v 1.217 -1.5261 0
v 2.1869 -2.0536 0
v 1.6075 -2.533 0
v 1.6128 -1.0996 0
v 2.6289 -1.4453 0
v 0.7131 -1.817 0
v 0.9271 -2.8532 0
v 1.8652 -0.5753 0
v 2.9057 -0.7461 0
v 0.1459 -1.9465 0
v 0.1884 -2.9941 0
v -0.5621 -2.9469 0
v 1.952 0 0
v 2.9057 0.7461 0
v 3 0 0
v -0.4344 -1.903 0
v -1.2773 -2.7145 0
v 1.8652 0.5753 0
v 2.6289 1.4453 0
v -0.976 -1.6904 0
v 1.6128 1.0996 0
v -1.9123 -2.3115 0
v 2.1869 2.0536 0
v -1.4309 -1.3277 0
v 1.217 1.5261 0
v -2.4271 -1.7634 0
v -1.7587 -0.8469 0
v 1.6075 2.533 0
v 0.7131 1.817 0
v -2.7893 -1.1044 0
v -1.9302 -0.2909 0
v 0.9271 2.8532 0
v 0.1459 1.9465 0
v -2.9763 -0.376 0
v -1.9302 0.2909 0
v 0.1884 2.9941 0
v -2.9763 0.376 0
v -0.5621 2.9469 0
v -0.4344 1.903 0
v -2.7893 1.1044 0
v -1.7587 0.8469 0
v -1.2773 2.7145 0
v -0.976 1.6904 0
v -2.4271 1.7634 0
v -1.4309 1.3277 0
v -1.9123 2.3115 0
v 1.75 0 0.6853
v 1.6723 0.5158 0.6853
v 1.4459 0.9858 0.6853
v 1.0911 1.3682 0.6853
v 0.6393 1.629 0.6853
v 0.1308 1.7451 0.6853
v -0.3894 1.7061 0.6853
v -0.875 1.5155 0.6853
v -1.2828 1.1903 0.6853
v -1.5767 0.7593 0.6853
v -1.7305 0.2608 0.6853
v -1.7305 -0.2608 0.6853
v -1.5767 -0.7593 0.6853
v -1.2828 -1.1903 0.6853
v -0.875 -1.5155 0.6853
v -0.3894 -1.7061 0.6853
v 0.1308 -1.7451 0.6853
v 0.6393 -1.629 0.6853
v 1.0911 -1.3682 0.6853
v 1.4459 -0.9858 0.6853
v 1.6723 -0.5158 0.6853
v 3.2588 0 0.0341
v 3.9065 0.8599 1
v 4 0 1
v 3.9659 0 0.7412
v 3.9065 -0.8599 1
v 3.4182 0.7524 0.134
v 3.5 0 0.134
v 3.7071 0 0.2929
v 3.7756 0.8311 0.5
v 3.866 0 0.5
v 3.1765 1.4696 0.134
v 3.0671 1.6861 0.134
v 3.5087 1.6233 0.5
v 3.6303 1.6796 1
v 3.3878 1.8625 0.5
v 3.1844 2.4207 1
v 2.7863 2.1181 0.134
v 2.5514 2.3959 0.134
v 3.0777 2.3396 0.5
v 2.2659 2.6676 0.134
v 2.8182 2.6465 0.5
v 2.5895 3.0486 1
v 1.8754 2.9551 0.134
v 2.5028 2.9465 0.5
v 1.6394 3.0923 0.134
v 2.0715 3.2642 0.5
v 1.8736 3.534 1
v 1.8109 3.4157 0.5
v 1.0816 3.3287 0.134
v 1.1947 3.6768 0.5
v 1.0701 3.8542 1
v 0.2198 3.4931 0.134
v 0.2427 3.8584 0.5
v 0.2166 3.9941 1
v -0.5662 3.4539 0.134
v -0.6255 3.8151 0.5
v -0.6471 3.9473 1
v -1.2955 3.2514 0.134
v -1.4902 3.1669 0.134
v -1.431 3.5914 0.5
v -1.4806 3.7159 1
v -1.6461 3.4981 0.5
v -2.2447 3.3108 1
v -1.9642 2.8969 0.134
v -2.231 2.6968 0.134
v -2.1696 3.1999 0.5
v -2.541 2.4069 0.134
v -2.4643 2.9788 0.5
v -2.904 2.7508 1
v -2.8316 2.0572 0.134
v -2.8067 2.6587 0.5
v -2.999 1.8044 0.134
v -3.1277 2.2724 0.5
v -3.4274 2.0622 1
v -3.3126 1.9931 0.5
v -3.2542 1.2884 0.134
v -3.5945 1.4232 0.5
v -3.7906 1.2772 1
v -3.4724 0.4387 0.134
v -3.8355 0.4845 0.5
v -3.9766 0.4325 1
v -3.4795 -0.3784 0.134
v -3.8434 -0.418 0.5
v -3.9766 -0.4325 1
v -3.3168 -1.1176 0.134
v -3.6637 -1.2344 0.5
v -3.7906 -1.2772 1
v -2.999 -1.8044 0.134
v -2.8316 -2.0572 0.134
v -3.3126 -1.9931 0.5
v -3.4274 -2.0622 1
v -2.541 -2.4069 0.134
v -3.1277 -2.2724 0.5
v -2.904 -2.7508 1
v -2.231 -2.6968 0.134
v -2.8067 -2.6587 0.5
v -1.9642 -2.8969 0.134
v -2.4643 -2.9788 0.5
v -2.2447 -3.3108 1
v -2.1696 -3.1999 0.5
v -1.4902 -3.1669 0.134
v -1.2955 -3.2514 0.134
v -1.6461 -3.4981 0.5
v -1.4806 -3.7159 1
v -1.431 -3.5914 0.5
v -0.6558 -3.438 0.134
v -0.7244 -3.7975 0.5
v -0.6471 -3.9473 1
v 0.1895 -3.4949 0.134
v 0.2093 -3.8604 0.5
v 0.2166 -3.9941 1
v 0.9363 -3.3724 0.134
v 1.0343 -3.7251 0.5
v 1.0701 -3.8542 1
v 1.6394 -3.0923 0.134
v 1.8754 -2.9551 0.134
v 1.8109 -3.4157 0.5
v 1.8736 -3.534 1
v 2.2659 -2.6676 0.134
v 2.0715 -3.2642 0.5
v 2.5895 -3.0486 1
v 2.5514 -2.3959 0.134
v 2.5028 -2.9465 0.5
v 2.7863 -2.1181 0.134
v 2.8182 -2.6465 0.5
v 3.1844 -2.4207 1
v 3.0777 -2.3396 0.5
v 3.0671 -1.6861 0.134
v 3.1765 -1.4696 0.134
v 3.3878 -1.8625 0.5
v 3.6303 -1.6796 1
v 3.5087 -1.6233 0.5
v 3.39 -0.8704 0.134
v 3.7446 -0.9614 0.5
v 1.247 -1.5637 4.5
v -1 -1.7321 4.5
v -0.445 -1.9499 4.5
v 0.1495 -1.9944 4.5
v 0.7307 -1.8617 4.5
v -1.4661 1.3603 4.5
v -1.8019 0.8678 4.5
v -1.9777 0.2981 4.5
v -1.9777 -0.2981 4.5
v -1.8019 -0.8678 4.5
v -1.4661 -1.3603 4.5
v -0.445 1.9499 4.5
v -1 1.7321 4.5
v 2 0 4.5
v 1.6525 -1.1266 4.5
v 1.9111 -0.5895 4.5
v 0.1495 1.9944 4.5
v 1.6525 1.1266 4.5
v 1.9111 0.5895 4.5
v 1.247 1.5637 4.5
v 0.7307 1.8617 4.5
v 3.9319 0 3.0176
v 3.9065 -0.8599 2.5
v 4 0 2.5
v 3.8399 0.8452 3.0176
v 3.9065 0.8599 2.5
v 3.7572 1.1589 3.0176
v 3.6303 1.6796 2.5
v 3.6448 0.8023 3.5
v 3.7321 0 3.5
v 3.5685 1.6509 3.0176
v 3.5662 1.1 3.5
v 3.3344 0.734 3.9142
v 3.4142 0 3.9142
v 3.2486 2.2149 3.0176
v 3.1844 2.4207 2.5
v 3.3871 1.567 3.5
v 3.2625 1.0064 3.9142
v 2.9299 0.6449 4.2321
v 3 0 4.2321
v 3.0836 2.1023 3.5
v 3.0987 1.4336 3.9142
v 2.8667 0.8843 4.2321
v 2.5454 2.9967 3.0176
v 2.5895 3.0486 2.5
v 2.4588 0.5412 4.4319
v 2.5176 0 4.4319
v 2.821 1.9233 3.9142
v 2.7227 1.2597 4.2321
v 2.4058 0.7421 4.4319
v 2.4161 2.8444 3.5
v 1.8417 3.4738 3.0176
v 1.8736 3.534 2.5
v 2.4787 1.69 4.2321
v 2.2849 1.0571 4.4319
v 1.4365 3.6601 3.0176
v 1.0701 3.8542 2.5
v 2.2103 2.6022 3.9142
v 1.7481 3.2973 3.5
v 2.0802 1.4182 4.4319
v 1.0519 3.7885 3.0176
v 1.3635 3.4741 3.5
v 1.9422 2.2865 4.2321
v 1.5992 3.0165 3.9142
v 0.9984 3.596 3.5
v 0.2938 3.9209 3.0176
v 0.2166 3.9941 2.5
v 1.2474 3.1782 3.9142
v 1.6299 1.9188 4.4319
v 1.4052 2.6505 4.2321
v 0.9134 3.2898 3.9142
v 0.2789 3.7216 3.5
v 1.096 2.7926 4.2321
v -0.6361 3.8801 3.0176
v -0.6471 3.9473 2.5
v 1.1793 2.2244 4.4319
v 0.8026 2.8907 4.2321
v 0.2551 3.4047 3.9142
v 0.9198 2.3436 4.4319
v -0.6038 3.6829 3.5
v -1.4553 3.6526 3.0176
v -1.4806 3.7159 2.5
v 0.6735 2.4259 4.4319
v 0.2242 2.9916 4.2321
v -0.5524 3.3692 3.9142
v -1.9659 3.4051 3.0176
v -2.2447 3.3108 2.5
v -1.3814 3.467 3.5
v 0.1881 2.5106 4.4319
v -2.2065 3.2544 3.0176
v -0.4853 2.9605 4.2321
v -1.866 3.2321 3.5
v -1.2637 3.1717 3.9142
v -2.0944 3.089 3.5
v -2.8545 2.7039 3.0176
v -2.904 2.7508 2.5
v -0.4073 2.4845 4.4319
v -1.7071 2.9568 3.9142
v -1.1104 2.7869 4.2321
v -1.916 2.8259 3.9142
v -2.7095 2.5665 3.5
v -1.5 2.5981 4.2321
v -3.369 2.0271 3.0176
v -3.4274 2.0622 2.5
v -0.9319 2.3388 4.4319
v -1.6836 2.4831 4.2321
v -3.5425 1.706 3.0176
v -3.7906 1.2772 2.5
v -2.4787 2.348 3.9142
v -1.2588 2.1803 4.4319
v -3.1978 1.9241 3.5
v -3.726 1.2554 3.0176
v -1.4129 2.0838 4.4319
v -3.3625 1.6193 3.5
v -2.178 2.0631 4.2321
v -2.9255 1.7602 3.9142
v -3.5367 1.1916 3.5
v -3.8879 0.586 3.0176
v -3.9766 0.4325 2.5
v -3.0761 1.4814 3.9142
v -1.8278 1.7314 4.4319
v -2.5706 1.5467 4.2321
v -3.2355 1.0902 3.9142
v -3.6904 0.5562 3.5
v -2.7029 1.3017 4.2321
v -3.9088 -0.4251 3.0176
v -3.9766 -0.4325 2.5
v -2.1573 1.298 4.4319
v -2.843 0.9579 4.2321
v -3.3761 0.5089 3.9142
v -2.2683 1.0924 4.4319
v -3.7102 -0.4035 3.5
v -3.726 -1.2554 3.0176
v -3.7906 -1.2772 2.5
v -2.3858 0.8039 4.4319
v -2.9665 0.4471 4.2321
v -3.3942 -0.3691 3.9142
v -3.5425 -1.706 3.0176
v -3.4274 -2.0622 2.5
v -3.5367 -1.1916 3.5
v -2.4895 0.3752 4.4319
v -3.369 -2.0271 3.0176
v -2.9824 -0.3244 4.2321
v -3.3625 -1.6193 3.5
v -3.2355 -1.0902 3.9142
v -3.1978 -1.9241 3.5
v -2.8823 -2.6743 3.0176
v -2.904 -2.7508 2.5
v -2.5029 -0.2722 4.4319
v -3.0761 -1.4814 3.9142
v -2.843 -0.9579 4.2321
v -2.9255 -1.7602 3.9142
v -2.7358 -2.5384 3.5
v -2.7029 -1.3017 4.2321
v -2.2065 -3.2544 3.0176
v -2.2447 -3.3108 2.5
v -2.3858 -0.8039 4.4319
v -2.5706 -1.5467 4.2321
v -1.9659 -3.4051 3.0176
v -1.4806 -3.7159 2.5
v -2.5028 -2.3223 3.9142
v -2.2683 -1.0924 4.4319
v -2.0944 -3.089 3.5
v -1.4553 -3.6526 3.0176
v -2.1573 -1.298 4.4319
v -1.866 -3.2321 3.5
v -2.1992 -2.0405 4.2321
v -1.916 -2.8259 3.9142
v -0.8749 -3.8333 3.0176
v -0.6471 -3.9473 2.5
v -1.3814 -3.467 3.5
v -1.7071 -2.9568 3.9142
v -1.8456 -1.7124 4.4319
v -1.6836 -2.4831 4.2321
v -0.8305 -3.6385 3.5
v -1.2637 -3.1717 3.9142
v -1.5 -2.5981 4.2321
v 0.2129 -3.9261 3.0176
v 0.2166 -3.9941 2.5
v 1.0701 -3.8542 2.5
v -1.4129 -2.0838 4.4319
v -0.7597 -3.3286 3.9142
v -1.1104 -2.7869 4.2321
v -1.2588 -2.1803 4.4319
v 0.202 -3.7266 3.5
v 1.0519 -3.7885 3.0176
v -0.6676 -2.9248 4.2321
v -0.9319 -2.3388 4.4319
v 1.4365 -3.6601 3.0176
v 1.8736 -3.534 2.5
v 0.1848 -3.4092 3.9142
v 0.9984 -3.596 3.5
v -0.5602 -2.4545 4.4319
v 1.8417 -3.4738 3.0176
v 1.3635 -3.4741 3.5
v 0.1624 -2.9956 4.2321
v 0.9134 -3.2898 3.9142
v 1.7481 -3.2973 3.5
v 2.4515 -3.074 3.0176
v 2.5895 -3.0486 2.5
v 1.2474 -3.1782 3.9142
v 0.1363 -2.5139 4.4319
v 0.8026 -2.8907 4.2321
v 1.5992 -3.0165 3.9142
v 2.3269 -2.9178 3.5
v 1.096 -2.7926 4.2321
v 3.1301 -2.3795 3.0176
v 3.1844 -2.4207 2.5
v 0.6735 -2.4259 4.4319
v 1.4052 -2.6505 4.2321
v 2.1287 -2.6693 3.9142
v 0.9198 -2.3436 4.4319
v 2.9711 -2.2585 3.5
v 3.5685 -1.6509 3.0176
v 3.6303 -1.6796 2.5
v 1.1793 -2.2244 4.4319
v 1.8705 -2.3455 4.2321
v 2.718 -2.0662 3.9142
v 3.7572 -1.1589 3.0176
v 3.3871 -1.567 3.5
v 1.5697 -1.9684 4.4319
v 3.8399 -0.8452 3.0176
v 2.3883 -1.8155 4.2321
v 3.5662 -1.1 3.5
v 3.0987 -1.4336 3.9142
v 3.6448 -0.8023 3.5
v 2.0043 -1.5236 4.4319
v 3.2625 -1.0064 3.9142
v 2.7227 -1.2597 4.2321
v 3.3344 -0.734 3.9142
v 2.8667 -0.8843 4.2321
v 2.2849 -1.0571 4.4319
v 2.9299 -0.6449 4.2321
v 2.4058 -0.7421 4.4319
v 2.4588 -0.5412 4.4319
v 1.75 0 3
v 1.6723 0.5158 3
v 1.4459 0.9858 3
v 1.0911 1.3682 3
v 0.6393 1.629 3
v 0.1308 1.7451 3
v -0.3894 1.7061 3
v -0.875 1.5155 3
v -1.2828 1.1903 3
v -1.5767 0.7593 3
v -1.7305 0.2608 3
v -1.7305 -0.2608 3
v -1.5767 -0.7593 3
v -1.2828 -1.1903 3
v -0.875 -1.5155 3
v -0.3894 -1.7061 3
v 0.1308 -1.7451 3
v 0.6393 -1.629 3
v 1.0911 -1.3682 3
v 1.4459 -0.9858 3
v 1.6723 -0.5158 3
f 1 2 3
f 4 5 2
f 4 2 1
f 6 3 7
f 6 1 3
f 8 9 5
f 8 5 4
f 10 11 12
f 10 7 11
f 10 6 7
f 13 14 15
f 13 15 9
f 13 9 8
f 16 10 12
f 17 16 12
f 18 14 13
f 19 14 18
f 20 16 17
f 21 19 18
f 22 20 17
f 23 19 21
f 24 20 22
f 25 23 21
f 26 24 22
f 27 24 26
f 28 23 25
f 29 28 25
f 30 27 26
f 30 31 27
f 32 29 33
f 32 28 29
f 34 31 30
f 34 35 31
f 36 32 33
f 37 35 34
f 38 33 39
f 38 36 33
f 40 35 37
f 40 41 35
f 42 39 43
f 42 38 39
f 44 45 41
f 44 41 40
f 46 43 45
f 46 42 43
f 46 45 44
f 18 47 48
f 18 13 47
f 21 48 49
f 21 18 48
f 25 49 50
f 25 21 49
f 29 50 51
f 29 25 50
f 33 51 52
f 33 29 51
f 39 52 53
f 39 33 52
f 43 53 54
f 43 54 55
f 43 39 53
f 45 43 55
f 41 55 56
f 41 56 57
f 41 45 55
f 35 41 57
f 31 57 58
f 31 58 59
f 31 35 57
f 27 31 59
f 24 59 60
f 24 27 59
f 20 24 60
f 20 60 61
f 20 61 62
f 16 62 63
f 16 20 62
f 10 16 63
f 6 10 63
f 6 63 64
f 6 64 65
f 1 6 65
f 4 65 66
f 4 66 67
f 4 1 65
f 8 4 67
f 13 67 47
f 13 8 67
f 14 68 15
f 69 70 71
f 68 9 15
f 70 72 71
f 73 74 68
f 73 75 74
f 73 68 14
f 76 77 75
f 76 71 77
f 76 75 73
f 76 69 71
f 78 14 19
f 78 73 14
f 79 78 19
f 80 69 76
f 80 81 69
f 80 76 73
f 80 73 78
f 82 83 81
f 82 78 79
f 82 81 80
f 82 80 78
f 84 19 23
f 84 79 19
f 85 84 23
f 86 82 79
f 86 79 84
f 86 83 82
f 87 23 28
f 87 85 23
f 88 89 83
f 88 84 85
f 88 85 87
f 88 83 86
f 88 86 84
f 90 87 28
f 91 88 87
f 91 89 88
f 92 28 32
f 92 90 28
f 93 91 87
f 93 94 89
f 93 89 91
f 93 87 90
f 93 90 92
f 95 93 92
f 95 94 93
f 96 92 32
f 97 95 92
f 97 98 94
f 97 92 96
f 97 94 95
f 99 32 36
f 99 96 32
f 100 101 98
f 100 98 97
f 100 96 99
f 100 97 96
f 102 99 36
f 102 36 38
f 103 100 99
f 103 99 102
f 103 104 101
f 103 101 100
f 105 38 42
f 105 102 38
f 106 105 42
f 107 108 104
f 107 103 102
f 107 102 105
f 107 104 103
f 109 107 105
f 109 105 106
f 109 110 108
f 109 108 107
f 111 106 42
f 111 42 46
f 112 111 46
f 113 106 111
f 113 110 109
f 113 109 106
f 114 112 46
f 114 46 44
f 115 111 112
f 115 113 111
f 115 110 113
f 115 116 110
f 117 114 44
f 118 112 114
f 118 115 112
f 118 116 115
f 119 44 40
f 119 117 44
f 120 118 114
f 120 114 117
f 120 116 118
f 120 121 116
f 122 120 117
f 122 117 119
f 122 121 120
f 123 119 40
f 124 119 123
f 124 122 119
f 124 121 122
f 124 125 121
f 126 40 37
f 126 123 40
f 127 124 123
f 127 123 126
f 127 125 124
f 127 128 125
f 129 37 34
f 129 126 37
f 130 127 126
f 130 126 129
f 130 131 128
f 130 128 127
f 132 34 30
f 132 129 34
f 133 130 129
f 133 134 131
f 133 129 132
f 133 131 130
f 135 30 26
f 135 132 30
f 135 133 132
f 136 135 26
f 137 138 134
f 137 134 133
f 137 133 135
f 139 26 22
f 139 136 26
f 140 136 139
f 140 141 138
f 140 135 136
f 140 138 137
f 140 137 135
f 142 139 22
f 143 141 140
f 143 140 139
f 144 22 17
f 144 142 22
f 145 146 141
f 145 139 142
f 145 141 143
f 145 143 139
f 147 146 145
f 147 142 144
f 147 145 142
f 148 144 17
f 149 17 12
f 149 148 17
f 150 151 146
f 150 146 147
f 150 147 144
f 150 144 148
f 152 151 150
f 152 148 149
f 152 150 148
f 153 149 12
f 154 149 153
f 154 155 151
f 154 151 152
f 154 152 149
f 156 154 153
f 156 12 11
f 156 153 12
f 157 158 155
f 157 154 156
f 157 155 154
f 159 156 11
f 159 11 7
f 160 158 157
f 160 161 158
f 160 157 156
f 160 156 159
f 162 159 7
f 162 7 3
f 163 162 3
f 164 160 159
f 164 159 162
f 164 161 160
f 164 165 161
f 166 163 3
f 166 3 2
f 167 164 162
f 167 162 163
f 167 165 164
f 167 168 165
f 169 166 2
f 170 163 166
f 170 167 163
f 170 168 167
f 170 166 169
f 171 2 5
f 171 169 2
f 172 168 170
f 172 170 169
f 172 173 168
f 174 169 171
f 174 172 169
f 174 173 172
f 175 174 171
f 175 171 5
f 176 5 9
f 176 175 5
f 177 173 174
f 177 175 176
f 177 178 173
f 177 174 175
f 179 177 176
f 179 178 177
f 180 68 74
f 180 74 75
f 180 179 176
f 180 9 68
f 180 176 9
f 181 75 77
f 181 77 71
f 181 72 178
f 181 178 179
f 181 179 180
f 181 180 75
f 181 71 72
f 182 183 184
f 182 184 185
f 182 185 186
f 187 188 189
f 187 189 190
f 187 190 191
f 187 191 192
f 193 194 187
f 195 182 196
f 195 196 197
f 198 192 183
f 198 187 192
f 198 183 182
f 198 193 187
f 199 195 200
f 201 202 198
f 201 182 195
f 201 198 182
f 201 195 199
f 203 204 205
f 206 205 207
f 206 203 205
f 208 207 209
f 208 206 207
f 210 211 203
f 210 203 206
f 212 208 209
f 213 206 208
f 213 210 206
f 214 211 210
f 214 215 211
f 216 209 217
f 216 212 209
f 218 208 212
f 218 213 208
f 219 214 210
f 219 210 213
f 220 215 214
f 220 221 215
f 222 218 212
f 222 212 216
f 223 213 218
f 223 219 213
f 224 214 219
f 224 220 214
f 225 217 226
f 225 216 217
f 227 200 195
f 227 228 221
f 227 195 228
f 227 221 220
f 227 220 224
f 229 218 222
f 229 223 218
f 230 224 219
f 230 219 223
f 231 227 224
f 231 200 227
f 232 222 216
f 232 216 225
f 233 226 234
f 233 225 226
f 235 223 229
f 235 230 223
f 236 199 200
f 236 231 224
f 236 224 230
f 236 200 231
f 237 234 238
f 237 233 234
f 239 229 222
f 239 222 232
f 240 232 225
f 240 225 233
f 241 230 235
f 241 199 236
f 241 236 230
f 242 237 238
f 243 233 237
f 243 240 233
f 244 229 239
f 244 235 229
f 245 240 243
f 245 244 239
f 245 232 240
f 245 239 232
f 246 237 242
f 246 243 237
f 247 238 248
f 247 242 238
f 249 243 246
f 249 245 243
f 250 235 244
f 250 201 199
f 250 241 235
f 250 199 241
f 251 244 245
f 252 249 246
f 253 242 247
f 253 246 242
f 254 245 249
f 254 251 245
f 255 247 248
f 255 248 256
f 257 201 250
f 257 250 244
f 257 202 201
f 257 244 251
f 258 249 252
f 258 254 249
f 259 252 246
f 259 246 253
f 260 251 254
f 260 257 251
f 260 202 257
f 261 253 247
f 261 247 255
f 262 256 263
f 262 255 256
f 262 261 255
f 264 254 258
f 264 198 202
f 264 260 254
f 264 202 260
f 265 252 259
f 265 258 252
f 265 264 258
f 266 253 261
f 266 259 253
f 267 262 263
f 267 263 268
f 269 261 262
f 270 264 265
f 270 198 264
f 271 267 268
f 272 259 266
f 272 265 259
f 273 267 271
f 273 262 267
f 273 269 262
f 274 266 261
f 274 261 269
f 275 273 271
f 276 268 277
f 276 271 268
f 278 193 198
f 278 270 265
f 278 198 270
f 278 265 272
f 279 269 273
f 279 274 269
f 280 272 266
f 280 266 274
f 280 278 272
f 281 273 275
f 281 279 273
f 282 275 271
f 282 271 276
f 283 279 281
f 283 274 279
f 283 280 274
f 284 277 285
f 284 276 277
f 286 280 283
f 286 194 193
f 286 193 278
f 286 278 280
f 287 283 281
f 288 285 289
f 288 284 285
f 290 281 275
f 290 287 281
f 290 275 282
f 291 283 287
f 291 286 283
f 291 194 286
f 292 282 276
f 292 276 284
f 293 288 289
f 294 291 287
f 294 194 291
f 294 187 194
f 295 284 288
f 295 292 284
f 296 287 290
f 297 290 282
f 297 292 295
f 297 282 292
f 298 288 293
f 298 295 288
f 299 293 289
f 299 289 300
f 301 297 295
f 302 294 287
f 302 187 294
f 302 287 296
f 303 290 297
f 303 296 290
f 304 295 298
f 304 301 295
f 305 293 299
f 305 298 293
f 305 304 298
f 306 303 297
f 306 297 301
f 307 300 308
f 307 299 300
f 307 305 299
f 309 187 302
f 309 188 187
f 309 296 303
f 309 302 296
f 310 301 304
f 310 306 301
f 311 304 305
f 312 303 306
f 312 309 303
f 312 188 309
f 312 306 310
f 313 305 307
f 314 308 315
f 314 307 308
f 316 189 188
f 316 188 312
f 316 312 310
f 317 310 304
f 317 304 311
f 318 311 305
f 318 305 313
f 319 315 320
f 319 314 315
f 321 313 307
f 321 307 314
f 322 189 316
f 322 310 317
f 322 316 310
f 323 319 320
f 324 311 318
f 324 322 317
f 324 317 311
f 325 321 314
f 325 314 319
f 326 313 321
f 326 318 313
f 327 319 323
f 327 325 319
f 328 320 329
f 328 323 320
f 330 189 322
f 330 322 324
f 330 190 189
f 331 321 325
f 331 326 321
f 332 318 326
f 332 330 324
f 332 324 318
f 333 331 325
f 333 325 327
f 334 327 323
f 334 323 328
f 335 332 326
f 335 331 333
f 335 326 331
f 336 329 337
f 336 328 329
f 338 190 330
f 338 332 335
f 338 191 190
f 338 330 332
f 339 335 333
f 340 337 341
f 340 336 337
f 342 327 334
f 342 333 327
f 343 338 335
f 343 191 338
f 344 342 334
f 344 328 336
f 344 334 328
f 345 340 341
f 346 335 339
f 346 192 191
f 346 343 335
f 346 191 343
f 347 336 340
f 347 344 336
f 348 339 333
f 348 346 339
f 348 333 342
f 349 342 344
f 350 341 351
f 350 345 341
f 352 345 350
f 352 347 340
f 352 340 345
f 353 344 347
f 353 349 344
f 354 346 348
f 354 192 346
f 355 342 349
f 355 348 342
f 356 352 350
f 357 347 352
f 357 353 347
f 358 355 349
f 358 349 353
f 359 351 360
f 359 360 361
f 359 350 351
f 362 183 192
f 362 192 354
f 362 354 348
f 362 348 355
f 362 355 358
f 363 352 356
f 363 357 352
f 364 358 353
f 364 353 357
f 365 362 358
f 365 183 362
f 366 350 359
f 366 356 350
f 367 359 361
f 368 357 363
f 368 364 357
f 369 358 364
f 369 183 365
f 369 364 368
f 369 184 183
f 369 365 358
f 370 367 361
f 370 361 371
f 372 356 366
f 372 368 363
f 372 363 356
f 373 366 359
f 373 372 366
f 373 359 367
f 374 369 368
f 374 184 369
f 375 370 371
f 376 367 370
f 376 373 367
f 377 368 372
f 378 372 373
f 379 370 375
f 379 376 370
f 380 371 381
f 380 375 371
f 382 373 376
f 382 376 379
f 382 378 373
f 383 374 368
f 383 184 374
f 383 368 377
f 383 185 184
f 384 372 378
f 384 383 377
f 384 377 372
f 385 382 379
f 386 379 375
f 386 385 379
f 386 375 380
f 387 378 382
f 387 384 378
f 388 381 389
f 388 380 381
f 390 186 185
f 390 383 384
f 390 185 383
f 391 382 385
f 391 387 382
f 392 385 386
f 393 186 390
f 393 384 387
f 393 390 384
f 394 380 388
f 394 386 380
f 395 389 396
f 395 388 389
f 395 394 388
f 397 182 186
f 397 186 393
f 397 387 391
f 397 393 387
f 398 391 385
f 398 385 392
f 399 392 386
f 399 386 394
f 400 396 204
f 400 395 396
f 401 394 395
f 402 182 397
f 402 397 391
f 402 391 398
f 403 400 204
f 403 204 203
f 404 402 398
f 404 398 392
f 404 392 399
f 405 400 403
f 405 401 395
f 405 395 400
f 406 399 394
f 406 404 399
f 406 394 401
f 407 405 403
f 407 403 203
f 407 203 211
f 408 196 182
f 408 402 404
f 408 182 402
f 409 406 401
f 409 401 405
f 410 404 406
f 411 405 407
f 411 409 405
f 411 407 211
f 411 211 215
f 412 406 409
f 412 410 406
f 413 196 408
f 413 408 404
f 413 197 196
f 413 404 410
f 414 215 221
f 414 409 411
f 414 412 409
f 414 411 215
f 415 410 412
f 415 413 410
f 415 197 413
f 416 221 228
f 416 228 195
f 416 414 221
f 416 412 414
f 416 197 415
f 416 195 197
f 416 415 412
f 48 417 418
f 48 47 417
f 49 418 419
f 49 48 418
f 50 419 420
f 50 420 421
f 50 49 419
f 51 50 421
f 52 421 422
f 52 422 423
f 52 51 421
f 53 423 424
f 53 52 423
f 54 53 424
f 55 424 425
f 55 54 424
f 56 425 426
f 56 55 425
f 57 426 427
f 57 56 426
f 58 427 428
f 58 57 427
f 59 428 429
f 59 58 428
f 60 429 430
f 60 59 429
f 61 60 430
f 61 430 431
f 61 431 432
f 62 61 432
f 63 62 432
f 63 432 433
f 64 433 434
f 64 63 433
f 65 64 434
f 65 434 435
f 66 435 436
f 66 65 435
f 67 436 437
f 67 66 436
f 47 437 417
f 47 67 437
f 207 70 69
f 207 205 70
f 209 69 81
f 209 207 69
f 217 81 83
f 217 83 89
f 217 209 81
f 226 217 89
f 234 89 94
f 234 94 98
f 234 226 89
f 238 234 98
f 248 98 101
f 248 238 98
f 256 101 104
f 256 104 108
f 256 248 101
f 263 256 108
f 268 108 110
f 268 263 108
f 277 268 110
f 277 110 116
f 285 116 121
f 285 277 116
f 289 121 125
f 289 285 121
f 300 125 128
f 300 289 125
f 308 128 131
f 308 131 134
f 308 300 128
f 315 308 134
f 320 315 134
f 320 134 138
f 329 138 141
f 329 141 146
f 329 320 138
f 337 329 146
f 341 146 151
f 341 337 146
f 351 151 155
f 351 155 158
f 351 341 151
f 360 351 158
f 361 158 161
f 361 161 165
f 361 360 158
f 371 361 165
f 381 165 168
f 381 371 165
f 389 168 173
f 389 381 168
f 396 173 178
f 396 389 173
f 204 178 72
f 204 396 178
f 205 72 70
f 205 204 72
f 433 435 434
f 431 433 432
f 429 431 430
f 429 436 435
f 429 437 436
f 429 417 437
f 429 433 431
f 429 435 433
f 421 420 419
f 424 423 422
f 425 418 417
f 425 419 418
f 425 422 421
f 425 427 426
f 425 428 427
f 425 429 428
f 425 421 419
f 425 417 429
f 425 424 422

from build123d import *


with BuildPart() as f1:
    # F0 (on Front) → F1 (revolve)
    with BuildSketch(Plane.XZ):
        with BuildLine():
            ThreePointArc((3, 0), (3.707107, 0.292893), (4, 1))
            Line((4, 1), (4, 2.5))
            ThreePointArc((4, 2.5), (3.414214, 3.914214), (2, 4.5))
            Line((2, 4.5), (0, 4.5))
            Line((0, 4.5), (0, 3))
            Line((0, 3), (1.75, 3))
            Line((1.75, 3), (1.75, 0.685272))
            Line((1.75, 0.685272), (1.951956, 0))
            Line((1.951956, 0), (3, 0))
        make_face()
    revolve(axis=Axis((0, 0, 144.955611), (0, 0, 1)))


solid = f1.part
